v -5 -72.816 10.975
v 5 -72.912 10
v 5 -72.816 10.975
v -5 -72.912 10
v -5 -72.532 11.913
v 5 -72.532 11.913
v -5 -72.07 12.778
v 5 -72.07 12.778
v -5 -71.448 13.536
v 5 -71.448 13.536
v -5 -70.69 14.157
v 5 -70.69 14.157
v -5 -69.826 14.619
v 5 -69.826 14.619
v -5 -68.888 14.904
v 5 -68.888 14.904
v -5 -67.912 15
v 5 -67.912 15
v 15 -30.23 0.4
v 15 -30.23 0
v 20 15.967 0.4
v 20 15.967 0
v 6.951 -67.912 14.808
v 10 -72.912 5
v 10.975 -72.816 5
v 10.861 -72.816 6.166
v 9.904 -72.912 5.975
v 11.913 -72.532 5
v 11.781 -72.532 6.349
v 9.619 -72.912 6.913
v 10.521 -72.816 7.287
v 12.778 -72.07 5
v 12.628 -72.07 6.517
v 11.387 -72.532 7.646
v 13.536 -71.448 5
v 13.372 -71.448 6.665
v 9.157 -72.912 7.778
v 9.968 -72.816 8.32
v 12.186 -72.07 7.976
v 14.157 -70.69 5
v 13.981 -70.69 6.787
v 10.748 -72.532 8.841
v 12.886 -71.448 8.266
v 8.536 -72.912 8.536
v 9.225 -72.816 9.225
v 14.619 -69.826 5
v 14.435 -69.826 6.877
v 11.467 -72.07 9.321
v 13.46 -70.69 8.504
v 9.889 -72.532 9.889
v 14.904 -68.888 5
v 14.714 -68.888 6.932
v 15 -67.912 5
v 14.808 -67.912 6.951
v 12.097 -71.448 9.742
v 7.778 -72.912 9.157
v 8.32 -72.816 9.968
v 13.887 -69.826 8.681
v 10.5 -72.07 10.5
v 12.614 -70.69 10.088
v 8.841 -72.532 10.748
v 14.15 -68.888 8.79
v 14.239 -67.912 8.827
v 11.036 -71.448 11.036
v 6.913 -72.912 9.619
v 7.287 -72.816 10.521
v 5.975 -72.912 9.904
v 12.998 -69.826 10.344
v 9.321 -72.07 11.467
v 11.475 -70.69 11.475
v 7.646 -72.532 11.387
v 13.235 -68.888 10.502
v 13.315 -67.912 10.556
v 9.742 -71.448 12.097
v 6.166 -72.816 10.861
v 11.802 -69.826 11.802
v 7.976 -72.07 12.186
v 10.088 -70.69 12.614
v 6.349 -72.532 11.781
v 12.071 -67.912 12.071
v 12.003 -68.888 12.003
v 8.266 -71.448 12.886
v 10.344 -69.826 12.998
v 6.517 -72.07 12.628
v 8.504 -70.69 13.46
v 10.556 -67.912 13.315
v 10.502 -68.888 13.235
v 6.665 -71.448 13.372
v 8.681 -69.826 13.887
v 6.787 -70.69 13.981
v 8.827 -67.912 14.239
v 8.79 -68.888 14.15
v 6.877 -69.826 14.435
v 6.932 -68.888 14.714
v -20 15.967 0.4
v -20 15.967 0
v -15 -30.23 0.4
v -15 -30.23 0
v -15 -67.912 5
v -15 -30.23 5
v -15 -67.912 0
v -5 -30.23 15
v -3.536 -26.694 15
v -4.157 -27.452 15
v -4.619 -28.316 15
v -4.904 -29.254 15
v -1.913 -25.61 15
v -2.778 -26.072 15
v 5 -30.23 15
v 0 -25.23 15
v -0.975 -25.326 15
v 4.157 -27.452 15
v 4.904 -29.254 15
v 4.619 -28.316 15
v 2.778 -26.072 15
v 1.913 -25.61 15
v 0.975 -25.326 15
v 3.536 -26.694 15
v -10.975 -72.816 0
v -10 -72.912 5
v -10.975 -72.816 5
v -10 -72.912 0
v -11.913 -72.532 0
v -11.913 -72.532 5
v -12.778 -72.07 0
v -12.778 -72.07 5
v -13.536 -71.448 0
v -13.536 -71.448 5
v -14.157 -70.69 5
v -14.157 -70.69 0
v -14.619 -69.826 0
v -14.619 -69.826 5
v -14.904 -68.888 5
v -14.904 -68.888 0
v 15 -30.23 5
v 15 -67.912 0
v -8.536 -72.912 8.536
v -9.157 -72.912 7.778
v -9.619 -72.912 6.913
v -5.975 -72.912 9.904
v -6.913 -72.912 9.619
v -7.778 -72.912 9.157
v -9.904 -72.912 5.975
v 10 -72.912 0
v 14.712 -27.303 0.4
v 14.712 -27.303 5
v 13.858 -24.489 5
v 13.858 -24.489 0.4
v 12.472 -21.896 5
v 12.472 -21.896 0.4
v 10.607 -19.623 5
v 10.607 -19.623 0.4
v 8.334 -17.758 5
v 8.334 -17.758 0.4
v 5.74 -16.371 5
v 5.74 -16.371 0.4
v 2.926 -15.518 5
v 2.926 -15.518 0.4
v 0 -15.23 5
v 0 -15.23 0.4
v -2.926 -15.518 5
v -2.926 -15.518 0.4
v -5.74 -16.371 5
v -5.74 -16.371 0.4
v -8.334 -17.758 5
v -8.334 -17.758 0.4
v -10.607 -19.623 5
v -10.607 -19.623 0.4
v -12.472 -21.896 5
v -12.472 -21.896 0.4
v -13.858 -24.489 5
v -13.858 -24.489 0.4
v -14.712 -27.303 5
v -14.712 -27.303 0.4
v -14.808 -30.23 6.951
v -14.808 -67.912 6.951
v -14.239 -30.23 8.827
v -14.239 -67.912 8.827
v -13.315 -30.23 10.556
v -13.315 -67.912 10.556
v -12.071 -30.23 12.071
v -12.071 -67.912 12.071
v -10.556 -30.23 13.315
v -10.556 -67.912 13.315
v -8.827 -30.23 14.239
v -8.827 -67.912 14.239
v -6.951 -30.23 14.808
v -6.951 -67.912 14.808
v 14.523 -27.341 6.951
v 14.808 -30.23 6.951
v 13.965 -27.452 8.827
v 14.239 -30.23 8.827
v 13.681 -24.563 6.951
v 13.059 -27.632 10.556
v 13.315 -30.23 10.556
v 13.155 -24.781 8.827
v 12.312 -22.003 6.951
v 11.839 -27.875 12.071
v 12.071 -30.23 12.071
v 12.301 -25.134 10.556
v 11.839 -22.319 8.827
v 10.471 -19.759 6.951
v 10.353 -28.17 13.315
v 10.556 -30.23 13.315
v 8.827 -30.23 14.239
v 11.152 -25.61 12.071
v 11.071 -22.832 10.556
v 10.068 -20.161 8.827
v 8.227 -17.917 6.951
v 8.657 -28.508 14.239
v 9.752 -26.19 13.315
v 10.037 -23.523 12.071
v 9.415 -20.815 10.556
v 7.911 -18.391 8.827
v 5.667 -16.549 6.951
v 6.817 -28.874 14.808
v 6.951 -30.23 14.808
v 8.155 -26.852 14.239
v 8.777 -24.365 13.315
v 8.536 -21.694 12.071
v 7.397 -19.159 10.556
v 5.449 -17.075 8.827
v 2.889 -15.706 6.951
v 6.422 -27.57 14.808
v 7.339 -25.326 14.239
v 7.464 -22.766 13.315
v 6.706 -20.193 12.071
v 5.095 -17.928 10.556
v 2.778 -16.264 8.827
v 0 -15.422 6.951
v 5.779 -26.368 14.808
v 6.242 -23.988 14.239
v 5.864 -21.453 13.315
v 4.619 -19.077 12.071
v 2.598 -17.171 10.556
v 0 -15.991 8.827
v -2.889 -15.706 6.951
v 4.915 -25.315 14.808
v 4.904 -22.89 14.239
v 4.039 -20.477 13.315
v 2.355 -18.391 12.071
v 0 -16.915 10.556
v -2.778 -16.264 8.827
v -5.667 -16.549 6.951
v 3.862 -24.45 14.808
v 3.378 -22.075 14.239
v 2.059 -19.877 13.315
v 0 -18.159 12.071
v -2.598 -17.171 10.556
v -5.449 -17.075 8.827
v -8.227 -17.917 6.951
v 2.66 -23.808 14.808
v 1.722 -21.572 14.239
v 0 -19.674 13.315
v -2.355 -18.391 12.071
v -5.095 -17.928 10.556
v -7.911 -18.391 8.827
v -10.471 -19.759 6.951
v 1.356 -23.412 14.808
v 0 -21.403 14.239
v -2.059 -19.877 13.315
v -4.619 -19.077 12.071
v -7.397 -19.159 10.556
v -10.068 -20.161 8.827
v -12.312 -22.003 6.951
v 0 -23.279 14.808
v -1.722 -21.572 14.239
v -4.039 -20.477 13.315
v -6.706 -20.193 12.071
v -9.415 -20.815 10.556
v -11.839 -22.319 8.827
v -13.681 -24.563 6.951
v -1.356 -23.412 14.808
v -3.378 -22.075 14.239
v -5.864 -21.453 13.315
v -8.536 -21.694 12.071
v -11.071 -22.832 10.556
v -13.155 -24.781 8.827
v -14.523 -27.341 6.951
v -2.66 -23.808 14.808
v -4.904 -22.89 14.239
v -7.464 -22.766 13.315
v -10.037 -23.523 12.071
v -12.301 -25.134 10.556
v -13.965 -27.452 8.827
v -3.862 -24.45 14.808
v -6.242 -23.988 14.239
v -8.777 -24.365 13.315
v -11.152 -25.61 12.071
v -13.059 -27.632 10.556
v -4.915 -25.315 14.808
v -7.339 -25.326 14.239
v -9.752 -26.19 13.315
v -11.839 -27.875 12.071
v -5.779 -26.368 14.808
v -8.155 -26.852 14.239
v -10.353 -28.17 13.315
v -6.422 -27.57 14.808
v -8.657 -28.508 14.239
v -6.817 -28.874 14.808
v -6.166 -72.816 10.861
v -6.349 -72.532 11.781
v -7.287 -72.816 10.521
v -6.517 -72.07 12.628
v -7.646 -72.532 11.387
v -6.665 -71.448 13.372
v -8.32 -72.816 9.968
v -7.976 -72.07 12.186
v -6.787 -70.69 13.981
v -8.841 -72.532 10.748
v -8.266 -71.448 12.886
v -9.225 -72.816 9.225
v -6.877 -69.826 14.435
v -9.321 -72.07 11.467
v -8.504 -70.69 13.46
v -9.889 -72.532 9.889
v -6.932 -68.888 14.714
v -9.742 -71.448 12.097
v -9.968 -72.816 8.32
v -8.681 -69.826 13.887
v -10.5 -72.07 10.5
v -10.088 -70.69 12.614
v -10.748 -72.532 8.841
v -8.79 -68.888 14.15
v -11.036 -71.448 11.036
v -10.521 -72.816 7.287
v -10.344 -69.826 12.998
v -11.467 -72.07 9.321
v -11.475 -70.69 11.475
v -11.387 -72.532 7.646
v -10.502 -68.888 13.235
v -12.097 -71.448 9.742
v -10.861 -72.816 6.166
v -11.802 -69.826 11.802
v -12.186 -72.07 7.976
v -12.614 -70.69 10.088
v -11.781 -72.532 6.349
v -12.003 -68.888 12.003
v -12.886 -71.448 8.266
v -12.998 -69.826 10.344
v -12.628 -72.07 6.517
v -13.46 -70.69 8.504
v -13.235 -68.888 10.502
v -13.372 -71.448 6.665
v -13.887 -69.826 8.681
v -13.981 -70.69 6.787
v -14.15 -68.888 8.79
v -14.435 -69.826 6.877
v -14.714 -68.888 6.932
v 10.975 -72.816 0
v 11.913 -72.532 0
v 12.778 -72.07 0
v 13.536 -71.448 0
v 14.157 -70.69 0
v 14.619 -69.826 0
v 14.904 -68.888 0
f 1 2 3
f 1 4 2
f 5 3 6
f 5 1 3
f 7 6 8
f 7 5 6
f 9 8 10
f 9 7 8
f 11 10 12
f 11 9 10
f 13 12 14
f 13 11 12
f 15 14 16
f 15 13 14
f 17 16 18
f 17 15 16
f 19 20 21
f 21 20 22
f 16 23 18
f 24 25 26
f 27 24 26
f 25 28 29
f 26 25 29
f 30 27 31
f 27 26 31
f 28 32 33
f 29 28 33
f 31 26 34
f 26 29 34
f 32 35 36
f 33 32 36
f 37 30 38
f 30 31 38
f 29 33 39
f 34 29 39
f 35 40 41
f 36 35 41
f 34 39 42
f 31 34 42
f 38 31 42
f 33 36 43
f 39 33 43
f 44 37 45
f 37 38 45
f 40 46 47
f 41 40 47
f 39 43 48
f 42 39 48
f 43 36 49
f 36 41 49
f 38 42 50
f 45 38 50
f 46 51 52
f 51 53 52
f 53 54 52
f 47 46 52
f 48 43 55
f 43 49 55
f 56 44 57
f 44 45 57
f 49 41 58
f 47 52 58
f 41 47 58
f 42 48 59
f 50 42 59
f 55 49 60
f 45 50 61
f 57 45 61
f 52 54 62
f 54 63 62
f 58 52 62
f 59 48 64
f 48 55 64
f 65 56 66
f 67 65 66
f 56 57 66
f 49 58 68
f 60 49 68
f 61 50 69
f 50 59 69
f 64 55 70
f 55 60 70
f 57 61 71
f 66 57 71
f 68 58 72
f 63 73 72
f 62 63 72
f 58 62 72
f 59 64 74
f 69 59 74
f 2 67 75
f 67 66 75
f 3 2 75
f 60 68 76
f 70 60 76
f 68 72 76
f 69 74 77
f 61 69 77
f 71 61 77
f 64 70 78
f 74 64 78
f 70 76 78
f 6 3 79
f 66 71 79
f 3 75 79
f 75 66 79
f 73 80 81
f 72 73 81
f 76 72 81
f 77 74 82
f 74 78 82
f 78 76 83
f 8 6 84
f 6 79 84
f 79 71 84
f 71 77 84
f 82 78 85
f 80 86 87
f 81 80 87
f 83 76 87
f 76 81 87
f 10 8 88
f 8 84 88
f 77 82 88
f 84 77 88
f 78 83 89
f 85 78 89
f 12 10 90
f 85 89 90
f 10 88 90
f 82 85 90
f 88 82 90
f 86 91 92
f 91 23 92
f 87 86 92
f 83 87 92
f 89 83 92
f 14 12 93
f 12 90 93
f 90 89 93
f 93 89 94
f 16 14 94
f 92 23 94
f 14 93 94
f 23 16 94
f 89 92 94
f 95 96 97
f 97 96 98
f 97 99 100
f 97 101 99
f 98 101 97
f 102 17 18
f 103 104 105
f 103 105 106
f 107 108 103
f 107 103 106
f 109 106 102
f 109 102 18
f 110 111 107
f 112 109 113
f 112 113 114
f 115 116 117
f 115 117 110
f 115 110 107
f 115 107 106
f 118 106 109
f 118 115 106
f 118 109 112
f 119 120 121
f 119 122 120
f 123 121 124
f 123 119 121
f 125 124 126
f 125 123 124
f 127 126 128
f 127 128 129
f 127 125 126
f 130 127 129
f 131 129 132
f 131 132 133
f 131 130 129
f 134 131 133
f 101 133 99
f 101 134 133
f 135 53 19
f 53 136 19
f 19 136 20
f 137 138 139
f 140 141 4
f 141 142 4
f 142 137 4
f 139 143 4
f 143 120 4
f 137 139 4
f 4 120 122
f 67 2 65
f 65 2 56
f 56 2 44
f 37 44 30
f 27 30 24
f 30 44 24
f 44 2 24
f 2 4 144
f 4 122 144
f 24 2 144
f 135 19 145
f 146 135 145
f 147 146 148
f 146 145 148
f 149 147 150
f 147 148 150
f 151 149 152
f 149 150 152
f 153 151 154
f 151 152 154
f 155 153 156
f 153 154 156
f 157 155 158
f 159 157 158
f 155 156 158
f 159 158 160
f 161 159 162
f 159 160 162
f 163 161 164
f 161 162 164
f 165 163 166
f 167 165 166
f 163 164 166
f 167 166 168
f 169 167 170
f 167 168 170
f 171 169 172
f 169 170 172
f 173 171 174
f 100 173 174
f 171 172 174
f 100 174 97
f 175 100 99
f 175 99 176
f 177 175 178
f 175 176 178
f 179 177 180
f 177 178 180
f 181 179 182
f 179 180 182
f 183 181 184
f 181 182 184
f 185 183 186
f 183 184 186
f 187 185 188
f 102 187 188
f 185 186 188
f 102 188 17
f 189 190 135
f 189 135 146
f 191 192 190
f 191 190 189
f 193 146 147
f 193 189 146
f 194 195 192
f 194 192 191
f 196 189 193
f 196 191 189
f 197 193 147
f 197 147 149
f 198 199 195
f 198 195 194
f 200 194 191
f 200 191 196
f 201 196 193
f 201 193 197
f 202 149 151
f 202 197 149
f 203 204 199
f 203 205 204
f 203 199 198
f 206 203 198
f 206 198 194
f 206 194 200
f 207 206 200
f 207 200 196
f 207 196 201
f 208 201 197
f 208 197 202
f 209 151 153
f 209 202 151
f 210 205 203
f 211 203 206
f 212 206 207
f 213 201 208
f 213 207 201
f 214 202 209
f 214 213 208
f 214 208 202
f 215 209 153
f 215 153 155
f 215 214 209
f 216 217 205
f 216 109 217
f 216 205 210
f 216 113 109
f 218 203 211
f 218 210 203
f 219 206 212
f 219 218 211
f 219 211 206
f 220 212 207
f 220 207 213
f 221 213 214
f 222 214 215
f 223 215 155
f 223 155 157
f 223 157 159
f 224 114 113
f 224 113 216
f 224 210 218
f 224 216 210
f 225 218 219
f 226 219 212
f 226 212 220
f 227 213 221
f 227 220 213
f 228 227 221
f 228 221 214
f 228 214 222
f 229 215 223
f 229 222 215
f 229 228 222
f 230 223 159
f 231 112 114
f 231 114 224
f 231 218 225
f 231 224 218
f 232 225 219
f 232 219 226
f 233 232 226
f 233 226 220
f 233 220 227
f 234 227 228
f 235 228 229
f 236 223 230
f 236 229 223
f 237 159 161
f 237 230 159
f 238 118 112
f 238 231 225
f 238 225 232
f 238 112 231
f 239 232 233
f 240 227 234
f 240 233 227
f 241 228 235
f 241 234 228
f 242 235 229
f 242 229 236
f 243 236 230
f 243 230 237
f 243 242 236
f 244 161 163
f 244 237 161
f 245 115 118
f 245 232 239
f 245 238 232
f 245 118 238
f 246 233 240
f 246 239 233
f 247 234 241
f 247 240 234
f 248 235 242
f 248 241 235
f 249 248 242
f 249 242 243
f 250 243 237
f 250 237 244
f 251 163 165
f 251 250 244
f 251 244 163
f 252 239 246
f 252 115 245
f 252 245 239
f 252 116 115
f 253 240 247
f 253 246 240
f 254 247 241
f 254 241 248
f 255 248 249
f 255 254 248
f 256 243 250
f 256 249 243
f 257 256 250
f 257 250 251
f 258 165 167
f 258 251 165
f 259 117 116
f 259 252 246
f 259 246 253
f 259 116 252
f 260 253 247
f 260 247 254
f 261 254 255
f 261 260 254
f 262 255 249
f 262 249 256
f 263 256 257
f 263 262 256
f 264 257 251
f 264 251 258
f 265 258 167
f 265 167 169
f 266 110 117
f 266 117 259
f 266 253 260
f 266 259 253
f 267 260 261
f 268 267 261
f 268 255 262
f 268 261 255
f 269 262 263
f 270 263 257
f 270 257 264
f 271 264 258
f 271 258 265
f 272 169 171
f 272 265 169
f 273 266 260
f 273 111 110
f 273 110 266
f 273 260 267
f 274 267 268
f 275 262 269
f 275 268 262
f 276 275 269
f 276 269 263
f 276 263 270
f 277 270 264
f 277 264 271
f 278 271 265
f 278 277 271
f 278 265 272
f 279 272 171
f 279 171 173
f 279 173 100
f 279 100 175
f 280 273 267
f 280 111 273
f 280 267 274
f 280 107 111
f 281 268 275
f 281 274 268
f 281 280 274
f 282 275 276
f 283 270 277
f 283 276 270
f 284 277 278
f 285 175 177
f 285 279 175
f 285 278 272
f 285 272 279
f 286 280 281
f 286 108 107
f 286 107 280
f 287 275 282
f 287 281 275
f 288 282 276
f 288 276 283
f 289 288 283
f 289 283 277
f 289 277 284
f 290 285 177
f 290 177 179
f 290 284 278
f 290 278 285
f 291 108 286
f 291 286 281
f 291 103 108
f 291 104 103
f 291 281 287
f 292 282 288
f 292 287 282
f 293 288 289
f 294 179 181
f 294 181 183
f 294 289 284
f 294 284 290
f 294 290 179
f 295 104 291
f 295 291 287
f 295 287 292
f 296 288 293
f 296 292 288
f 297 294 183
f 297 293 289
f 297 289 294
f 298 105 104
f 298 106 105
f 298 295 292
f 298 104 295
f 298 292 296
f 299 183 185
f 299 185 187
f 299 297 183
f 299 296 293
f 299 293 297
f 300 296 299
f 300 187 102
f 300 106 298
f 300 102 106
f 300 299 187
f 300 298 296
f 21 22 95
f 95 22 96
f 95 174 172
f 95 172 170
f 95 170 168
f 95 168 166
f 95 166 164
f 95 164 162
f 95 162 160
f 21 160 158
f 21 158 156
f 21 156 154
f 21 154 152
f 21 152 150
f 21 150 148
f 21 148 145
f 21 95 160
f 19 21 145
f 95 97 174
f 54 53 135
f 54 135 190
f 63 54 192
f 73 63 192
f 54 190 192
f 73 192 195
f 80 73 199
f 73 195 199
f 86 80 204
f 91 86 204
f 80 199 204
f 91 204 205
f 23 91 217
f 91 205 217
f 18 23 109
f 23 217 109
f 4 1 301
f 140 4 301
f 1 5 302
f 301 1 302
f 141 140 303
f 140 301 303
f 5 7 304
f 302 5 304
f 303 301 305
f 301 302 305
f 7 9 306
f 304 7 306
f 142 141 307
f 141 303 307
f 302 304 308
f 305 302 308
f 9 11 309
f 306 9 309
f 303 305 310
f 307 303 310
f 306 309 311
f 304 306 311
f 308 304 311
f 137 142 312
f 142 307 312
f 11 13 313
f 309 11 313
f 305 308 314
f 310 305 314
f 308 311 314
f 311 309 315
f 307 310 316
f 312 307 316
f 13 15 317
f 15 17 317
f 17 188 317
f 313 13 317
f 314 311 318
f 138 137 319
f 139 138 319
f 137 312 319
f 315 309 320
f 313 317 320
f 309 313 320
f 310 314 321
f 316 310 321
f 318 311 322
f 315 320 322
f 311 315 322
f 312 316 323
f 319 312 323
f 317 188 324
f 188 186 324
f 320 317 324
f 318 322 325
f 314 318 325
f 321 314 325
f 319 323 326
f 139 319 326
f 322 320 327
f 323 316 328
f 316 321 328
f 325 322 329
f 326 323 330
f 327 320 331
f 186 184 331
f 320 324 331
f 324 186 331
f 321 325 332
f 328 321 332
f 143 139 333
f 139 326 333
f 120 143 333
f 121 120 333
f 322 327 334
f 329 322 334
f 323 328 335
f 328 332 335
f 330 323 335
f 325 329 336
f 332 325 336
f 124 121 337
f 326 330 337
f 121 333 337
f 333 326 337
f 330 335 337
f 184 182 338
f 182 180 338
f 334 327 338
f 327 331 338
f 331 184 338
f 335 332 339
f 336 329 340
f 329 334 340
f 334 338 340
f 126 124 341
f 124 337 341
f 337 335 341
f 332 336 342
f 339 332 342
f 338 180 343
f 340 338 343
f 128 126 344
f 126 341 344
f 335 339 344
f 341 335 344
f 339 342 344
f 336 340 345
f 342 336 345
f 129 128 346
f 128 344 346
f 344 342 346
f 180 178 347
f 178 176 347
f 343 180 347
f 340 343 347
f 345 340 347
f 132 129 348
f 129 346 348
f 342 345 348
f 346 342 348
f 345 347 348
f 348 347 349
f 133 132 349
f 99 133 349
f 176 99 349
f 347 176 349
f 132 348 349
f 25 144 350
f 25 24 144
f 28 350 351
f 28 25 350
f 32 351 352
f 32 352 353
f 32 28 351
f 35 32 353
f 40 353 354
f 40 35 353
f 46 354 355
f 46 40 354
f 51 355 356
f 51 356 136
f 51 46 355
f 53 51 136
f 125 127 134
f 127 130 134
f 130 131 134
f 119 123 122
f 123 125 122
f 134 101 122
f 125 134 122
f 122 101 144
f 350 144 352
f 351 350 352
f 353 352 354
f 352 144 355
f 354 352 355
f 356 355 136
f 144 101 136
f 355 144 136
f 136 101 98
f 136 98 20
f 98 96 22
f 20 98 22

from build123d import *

# Parameters (mm, degrees)
F1_DEPTH = 0.4
F0_W     = 15
F0_H     = 42.6826924086
F2_DEPTH = 15
F3_R     = 10
F4_R     = 5


with BuildPart() as f1:
    # F0 (on Top) → F1 (new body)
    with BuildSketch(Plane.XY):
        with BuildLine():
            ThreePointArc((0, -15.2296504378), (10.6066017178, -19.62304872), (15, -30.2296504378))
            Line((15, -30.2296504378), (20, 15.9674037131))
            Line((20, 15.9674037131), (-20, 15.9674037131))
            Line((-20, 15.9674037131), (-15, -30.2296504378))
            ThreePointArc((-15, -30.2296504378), (-10.6066017178, -19.62304872), (0, -15.2296504378))
        make_face()
    extrude(amount=F1_DEPTH)

    # F0 (on Top) → F2 (join)
    with BuildSketch(Plane.XY):
        with Locations((7.5, -51.5709966421)):
            Rectangle(F0_W, F0_H)
        with BuildLine():
            Line((0, -30.2296504378), (15, -30.2296504378))
            ThreePointArc((15, -30.2296504378), (10.6066017178, -19.62304872), (0, -15.2296504378))
            Line((0, -15.2296504378), (0, -30.2296504378))
        make_face()
        with BuildLine():
            Line((-15, -30.2296504378), (0, -30.2296504378))
            Line((0, -30.2296504378), (0, -15.2296504378))
            ThreePointArc((0, -15.2296504378), (-10.6066017178, -19.62304872), (-15, -30.2296504378))
        make_face()
        with Locations((-7.5, -51.5709966421)):
            Rectangle(F0_W, F0_H)
    extrude(amount=F2_DEPTH)

    # F3
    f3_edges = [f1.edges().sort_by_distance(p)[0] for p in [
        (0, -15.22965, 15),
    ]]
    fillet(f3_edges, radius=F3_R)

    # F4
    f4_edges = [f1.edges().sort_by_distance(p)[0] for p in [
        (12.071068, -72.912343, 12.071068),
    ]]
    fillet(f4_edges, radius=F4_R)


solid = f1.part
